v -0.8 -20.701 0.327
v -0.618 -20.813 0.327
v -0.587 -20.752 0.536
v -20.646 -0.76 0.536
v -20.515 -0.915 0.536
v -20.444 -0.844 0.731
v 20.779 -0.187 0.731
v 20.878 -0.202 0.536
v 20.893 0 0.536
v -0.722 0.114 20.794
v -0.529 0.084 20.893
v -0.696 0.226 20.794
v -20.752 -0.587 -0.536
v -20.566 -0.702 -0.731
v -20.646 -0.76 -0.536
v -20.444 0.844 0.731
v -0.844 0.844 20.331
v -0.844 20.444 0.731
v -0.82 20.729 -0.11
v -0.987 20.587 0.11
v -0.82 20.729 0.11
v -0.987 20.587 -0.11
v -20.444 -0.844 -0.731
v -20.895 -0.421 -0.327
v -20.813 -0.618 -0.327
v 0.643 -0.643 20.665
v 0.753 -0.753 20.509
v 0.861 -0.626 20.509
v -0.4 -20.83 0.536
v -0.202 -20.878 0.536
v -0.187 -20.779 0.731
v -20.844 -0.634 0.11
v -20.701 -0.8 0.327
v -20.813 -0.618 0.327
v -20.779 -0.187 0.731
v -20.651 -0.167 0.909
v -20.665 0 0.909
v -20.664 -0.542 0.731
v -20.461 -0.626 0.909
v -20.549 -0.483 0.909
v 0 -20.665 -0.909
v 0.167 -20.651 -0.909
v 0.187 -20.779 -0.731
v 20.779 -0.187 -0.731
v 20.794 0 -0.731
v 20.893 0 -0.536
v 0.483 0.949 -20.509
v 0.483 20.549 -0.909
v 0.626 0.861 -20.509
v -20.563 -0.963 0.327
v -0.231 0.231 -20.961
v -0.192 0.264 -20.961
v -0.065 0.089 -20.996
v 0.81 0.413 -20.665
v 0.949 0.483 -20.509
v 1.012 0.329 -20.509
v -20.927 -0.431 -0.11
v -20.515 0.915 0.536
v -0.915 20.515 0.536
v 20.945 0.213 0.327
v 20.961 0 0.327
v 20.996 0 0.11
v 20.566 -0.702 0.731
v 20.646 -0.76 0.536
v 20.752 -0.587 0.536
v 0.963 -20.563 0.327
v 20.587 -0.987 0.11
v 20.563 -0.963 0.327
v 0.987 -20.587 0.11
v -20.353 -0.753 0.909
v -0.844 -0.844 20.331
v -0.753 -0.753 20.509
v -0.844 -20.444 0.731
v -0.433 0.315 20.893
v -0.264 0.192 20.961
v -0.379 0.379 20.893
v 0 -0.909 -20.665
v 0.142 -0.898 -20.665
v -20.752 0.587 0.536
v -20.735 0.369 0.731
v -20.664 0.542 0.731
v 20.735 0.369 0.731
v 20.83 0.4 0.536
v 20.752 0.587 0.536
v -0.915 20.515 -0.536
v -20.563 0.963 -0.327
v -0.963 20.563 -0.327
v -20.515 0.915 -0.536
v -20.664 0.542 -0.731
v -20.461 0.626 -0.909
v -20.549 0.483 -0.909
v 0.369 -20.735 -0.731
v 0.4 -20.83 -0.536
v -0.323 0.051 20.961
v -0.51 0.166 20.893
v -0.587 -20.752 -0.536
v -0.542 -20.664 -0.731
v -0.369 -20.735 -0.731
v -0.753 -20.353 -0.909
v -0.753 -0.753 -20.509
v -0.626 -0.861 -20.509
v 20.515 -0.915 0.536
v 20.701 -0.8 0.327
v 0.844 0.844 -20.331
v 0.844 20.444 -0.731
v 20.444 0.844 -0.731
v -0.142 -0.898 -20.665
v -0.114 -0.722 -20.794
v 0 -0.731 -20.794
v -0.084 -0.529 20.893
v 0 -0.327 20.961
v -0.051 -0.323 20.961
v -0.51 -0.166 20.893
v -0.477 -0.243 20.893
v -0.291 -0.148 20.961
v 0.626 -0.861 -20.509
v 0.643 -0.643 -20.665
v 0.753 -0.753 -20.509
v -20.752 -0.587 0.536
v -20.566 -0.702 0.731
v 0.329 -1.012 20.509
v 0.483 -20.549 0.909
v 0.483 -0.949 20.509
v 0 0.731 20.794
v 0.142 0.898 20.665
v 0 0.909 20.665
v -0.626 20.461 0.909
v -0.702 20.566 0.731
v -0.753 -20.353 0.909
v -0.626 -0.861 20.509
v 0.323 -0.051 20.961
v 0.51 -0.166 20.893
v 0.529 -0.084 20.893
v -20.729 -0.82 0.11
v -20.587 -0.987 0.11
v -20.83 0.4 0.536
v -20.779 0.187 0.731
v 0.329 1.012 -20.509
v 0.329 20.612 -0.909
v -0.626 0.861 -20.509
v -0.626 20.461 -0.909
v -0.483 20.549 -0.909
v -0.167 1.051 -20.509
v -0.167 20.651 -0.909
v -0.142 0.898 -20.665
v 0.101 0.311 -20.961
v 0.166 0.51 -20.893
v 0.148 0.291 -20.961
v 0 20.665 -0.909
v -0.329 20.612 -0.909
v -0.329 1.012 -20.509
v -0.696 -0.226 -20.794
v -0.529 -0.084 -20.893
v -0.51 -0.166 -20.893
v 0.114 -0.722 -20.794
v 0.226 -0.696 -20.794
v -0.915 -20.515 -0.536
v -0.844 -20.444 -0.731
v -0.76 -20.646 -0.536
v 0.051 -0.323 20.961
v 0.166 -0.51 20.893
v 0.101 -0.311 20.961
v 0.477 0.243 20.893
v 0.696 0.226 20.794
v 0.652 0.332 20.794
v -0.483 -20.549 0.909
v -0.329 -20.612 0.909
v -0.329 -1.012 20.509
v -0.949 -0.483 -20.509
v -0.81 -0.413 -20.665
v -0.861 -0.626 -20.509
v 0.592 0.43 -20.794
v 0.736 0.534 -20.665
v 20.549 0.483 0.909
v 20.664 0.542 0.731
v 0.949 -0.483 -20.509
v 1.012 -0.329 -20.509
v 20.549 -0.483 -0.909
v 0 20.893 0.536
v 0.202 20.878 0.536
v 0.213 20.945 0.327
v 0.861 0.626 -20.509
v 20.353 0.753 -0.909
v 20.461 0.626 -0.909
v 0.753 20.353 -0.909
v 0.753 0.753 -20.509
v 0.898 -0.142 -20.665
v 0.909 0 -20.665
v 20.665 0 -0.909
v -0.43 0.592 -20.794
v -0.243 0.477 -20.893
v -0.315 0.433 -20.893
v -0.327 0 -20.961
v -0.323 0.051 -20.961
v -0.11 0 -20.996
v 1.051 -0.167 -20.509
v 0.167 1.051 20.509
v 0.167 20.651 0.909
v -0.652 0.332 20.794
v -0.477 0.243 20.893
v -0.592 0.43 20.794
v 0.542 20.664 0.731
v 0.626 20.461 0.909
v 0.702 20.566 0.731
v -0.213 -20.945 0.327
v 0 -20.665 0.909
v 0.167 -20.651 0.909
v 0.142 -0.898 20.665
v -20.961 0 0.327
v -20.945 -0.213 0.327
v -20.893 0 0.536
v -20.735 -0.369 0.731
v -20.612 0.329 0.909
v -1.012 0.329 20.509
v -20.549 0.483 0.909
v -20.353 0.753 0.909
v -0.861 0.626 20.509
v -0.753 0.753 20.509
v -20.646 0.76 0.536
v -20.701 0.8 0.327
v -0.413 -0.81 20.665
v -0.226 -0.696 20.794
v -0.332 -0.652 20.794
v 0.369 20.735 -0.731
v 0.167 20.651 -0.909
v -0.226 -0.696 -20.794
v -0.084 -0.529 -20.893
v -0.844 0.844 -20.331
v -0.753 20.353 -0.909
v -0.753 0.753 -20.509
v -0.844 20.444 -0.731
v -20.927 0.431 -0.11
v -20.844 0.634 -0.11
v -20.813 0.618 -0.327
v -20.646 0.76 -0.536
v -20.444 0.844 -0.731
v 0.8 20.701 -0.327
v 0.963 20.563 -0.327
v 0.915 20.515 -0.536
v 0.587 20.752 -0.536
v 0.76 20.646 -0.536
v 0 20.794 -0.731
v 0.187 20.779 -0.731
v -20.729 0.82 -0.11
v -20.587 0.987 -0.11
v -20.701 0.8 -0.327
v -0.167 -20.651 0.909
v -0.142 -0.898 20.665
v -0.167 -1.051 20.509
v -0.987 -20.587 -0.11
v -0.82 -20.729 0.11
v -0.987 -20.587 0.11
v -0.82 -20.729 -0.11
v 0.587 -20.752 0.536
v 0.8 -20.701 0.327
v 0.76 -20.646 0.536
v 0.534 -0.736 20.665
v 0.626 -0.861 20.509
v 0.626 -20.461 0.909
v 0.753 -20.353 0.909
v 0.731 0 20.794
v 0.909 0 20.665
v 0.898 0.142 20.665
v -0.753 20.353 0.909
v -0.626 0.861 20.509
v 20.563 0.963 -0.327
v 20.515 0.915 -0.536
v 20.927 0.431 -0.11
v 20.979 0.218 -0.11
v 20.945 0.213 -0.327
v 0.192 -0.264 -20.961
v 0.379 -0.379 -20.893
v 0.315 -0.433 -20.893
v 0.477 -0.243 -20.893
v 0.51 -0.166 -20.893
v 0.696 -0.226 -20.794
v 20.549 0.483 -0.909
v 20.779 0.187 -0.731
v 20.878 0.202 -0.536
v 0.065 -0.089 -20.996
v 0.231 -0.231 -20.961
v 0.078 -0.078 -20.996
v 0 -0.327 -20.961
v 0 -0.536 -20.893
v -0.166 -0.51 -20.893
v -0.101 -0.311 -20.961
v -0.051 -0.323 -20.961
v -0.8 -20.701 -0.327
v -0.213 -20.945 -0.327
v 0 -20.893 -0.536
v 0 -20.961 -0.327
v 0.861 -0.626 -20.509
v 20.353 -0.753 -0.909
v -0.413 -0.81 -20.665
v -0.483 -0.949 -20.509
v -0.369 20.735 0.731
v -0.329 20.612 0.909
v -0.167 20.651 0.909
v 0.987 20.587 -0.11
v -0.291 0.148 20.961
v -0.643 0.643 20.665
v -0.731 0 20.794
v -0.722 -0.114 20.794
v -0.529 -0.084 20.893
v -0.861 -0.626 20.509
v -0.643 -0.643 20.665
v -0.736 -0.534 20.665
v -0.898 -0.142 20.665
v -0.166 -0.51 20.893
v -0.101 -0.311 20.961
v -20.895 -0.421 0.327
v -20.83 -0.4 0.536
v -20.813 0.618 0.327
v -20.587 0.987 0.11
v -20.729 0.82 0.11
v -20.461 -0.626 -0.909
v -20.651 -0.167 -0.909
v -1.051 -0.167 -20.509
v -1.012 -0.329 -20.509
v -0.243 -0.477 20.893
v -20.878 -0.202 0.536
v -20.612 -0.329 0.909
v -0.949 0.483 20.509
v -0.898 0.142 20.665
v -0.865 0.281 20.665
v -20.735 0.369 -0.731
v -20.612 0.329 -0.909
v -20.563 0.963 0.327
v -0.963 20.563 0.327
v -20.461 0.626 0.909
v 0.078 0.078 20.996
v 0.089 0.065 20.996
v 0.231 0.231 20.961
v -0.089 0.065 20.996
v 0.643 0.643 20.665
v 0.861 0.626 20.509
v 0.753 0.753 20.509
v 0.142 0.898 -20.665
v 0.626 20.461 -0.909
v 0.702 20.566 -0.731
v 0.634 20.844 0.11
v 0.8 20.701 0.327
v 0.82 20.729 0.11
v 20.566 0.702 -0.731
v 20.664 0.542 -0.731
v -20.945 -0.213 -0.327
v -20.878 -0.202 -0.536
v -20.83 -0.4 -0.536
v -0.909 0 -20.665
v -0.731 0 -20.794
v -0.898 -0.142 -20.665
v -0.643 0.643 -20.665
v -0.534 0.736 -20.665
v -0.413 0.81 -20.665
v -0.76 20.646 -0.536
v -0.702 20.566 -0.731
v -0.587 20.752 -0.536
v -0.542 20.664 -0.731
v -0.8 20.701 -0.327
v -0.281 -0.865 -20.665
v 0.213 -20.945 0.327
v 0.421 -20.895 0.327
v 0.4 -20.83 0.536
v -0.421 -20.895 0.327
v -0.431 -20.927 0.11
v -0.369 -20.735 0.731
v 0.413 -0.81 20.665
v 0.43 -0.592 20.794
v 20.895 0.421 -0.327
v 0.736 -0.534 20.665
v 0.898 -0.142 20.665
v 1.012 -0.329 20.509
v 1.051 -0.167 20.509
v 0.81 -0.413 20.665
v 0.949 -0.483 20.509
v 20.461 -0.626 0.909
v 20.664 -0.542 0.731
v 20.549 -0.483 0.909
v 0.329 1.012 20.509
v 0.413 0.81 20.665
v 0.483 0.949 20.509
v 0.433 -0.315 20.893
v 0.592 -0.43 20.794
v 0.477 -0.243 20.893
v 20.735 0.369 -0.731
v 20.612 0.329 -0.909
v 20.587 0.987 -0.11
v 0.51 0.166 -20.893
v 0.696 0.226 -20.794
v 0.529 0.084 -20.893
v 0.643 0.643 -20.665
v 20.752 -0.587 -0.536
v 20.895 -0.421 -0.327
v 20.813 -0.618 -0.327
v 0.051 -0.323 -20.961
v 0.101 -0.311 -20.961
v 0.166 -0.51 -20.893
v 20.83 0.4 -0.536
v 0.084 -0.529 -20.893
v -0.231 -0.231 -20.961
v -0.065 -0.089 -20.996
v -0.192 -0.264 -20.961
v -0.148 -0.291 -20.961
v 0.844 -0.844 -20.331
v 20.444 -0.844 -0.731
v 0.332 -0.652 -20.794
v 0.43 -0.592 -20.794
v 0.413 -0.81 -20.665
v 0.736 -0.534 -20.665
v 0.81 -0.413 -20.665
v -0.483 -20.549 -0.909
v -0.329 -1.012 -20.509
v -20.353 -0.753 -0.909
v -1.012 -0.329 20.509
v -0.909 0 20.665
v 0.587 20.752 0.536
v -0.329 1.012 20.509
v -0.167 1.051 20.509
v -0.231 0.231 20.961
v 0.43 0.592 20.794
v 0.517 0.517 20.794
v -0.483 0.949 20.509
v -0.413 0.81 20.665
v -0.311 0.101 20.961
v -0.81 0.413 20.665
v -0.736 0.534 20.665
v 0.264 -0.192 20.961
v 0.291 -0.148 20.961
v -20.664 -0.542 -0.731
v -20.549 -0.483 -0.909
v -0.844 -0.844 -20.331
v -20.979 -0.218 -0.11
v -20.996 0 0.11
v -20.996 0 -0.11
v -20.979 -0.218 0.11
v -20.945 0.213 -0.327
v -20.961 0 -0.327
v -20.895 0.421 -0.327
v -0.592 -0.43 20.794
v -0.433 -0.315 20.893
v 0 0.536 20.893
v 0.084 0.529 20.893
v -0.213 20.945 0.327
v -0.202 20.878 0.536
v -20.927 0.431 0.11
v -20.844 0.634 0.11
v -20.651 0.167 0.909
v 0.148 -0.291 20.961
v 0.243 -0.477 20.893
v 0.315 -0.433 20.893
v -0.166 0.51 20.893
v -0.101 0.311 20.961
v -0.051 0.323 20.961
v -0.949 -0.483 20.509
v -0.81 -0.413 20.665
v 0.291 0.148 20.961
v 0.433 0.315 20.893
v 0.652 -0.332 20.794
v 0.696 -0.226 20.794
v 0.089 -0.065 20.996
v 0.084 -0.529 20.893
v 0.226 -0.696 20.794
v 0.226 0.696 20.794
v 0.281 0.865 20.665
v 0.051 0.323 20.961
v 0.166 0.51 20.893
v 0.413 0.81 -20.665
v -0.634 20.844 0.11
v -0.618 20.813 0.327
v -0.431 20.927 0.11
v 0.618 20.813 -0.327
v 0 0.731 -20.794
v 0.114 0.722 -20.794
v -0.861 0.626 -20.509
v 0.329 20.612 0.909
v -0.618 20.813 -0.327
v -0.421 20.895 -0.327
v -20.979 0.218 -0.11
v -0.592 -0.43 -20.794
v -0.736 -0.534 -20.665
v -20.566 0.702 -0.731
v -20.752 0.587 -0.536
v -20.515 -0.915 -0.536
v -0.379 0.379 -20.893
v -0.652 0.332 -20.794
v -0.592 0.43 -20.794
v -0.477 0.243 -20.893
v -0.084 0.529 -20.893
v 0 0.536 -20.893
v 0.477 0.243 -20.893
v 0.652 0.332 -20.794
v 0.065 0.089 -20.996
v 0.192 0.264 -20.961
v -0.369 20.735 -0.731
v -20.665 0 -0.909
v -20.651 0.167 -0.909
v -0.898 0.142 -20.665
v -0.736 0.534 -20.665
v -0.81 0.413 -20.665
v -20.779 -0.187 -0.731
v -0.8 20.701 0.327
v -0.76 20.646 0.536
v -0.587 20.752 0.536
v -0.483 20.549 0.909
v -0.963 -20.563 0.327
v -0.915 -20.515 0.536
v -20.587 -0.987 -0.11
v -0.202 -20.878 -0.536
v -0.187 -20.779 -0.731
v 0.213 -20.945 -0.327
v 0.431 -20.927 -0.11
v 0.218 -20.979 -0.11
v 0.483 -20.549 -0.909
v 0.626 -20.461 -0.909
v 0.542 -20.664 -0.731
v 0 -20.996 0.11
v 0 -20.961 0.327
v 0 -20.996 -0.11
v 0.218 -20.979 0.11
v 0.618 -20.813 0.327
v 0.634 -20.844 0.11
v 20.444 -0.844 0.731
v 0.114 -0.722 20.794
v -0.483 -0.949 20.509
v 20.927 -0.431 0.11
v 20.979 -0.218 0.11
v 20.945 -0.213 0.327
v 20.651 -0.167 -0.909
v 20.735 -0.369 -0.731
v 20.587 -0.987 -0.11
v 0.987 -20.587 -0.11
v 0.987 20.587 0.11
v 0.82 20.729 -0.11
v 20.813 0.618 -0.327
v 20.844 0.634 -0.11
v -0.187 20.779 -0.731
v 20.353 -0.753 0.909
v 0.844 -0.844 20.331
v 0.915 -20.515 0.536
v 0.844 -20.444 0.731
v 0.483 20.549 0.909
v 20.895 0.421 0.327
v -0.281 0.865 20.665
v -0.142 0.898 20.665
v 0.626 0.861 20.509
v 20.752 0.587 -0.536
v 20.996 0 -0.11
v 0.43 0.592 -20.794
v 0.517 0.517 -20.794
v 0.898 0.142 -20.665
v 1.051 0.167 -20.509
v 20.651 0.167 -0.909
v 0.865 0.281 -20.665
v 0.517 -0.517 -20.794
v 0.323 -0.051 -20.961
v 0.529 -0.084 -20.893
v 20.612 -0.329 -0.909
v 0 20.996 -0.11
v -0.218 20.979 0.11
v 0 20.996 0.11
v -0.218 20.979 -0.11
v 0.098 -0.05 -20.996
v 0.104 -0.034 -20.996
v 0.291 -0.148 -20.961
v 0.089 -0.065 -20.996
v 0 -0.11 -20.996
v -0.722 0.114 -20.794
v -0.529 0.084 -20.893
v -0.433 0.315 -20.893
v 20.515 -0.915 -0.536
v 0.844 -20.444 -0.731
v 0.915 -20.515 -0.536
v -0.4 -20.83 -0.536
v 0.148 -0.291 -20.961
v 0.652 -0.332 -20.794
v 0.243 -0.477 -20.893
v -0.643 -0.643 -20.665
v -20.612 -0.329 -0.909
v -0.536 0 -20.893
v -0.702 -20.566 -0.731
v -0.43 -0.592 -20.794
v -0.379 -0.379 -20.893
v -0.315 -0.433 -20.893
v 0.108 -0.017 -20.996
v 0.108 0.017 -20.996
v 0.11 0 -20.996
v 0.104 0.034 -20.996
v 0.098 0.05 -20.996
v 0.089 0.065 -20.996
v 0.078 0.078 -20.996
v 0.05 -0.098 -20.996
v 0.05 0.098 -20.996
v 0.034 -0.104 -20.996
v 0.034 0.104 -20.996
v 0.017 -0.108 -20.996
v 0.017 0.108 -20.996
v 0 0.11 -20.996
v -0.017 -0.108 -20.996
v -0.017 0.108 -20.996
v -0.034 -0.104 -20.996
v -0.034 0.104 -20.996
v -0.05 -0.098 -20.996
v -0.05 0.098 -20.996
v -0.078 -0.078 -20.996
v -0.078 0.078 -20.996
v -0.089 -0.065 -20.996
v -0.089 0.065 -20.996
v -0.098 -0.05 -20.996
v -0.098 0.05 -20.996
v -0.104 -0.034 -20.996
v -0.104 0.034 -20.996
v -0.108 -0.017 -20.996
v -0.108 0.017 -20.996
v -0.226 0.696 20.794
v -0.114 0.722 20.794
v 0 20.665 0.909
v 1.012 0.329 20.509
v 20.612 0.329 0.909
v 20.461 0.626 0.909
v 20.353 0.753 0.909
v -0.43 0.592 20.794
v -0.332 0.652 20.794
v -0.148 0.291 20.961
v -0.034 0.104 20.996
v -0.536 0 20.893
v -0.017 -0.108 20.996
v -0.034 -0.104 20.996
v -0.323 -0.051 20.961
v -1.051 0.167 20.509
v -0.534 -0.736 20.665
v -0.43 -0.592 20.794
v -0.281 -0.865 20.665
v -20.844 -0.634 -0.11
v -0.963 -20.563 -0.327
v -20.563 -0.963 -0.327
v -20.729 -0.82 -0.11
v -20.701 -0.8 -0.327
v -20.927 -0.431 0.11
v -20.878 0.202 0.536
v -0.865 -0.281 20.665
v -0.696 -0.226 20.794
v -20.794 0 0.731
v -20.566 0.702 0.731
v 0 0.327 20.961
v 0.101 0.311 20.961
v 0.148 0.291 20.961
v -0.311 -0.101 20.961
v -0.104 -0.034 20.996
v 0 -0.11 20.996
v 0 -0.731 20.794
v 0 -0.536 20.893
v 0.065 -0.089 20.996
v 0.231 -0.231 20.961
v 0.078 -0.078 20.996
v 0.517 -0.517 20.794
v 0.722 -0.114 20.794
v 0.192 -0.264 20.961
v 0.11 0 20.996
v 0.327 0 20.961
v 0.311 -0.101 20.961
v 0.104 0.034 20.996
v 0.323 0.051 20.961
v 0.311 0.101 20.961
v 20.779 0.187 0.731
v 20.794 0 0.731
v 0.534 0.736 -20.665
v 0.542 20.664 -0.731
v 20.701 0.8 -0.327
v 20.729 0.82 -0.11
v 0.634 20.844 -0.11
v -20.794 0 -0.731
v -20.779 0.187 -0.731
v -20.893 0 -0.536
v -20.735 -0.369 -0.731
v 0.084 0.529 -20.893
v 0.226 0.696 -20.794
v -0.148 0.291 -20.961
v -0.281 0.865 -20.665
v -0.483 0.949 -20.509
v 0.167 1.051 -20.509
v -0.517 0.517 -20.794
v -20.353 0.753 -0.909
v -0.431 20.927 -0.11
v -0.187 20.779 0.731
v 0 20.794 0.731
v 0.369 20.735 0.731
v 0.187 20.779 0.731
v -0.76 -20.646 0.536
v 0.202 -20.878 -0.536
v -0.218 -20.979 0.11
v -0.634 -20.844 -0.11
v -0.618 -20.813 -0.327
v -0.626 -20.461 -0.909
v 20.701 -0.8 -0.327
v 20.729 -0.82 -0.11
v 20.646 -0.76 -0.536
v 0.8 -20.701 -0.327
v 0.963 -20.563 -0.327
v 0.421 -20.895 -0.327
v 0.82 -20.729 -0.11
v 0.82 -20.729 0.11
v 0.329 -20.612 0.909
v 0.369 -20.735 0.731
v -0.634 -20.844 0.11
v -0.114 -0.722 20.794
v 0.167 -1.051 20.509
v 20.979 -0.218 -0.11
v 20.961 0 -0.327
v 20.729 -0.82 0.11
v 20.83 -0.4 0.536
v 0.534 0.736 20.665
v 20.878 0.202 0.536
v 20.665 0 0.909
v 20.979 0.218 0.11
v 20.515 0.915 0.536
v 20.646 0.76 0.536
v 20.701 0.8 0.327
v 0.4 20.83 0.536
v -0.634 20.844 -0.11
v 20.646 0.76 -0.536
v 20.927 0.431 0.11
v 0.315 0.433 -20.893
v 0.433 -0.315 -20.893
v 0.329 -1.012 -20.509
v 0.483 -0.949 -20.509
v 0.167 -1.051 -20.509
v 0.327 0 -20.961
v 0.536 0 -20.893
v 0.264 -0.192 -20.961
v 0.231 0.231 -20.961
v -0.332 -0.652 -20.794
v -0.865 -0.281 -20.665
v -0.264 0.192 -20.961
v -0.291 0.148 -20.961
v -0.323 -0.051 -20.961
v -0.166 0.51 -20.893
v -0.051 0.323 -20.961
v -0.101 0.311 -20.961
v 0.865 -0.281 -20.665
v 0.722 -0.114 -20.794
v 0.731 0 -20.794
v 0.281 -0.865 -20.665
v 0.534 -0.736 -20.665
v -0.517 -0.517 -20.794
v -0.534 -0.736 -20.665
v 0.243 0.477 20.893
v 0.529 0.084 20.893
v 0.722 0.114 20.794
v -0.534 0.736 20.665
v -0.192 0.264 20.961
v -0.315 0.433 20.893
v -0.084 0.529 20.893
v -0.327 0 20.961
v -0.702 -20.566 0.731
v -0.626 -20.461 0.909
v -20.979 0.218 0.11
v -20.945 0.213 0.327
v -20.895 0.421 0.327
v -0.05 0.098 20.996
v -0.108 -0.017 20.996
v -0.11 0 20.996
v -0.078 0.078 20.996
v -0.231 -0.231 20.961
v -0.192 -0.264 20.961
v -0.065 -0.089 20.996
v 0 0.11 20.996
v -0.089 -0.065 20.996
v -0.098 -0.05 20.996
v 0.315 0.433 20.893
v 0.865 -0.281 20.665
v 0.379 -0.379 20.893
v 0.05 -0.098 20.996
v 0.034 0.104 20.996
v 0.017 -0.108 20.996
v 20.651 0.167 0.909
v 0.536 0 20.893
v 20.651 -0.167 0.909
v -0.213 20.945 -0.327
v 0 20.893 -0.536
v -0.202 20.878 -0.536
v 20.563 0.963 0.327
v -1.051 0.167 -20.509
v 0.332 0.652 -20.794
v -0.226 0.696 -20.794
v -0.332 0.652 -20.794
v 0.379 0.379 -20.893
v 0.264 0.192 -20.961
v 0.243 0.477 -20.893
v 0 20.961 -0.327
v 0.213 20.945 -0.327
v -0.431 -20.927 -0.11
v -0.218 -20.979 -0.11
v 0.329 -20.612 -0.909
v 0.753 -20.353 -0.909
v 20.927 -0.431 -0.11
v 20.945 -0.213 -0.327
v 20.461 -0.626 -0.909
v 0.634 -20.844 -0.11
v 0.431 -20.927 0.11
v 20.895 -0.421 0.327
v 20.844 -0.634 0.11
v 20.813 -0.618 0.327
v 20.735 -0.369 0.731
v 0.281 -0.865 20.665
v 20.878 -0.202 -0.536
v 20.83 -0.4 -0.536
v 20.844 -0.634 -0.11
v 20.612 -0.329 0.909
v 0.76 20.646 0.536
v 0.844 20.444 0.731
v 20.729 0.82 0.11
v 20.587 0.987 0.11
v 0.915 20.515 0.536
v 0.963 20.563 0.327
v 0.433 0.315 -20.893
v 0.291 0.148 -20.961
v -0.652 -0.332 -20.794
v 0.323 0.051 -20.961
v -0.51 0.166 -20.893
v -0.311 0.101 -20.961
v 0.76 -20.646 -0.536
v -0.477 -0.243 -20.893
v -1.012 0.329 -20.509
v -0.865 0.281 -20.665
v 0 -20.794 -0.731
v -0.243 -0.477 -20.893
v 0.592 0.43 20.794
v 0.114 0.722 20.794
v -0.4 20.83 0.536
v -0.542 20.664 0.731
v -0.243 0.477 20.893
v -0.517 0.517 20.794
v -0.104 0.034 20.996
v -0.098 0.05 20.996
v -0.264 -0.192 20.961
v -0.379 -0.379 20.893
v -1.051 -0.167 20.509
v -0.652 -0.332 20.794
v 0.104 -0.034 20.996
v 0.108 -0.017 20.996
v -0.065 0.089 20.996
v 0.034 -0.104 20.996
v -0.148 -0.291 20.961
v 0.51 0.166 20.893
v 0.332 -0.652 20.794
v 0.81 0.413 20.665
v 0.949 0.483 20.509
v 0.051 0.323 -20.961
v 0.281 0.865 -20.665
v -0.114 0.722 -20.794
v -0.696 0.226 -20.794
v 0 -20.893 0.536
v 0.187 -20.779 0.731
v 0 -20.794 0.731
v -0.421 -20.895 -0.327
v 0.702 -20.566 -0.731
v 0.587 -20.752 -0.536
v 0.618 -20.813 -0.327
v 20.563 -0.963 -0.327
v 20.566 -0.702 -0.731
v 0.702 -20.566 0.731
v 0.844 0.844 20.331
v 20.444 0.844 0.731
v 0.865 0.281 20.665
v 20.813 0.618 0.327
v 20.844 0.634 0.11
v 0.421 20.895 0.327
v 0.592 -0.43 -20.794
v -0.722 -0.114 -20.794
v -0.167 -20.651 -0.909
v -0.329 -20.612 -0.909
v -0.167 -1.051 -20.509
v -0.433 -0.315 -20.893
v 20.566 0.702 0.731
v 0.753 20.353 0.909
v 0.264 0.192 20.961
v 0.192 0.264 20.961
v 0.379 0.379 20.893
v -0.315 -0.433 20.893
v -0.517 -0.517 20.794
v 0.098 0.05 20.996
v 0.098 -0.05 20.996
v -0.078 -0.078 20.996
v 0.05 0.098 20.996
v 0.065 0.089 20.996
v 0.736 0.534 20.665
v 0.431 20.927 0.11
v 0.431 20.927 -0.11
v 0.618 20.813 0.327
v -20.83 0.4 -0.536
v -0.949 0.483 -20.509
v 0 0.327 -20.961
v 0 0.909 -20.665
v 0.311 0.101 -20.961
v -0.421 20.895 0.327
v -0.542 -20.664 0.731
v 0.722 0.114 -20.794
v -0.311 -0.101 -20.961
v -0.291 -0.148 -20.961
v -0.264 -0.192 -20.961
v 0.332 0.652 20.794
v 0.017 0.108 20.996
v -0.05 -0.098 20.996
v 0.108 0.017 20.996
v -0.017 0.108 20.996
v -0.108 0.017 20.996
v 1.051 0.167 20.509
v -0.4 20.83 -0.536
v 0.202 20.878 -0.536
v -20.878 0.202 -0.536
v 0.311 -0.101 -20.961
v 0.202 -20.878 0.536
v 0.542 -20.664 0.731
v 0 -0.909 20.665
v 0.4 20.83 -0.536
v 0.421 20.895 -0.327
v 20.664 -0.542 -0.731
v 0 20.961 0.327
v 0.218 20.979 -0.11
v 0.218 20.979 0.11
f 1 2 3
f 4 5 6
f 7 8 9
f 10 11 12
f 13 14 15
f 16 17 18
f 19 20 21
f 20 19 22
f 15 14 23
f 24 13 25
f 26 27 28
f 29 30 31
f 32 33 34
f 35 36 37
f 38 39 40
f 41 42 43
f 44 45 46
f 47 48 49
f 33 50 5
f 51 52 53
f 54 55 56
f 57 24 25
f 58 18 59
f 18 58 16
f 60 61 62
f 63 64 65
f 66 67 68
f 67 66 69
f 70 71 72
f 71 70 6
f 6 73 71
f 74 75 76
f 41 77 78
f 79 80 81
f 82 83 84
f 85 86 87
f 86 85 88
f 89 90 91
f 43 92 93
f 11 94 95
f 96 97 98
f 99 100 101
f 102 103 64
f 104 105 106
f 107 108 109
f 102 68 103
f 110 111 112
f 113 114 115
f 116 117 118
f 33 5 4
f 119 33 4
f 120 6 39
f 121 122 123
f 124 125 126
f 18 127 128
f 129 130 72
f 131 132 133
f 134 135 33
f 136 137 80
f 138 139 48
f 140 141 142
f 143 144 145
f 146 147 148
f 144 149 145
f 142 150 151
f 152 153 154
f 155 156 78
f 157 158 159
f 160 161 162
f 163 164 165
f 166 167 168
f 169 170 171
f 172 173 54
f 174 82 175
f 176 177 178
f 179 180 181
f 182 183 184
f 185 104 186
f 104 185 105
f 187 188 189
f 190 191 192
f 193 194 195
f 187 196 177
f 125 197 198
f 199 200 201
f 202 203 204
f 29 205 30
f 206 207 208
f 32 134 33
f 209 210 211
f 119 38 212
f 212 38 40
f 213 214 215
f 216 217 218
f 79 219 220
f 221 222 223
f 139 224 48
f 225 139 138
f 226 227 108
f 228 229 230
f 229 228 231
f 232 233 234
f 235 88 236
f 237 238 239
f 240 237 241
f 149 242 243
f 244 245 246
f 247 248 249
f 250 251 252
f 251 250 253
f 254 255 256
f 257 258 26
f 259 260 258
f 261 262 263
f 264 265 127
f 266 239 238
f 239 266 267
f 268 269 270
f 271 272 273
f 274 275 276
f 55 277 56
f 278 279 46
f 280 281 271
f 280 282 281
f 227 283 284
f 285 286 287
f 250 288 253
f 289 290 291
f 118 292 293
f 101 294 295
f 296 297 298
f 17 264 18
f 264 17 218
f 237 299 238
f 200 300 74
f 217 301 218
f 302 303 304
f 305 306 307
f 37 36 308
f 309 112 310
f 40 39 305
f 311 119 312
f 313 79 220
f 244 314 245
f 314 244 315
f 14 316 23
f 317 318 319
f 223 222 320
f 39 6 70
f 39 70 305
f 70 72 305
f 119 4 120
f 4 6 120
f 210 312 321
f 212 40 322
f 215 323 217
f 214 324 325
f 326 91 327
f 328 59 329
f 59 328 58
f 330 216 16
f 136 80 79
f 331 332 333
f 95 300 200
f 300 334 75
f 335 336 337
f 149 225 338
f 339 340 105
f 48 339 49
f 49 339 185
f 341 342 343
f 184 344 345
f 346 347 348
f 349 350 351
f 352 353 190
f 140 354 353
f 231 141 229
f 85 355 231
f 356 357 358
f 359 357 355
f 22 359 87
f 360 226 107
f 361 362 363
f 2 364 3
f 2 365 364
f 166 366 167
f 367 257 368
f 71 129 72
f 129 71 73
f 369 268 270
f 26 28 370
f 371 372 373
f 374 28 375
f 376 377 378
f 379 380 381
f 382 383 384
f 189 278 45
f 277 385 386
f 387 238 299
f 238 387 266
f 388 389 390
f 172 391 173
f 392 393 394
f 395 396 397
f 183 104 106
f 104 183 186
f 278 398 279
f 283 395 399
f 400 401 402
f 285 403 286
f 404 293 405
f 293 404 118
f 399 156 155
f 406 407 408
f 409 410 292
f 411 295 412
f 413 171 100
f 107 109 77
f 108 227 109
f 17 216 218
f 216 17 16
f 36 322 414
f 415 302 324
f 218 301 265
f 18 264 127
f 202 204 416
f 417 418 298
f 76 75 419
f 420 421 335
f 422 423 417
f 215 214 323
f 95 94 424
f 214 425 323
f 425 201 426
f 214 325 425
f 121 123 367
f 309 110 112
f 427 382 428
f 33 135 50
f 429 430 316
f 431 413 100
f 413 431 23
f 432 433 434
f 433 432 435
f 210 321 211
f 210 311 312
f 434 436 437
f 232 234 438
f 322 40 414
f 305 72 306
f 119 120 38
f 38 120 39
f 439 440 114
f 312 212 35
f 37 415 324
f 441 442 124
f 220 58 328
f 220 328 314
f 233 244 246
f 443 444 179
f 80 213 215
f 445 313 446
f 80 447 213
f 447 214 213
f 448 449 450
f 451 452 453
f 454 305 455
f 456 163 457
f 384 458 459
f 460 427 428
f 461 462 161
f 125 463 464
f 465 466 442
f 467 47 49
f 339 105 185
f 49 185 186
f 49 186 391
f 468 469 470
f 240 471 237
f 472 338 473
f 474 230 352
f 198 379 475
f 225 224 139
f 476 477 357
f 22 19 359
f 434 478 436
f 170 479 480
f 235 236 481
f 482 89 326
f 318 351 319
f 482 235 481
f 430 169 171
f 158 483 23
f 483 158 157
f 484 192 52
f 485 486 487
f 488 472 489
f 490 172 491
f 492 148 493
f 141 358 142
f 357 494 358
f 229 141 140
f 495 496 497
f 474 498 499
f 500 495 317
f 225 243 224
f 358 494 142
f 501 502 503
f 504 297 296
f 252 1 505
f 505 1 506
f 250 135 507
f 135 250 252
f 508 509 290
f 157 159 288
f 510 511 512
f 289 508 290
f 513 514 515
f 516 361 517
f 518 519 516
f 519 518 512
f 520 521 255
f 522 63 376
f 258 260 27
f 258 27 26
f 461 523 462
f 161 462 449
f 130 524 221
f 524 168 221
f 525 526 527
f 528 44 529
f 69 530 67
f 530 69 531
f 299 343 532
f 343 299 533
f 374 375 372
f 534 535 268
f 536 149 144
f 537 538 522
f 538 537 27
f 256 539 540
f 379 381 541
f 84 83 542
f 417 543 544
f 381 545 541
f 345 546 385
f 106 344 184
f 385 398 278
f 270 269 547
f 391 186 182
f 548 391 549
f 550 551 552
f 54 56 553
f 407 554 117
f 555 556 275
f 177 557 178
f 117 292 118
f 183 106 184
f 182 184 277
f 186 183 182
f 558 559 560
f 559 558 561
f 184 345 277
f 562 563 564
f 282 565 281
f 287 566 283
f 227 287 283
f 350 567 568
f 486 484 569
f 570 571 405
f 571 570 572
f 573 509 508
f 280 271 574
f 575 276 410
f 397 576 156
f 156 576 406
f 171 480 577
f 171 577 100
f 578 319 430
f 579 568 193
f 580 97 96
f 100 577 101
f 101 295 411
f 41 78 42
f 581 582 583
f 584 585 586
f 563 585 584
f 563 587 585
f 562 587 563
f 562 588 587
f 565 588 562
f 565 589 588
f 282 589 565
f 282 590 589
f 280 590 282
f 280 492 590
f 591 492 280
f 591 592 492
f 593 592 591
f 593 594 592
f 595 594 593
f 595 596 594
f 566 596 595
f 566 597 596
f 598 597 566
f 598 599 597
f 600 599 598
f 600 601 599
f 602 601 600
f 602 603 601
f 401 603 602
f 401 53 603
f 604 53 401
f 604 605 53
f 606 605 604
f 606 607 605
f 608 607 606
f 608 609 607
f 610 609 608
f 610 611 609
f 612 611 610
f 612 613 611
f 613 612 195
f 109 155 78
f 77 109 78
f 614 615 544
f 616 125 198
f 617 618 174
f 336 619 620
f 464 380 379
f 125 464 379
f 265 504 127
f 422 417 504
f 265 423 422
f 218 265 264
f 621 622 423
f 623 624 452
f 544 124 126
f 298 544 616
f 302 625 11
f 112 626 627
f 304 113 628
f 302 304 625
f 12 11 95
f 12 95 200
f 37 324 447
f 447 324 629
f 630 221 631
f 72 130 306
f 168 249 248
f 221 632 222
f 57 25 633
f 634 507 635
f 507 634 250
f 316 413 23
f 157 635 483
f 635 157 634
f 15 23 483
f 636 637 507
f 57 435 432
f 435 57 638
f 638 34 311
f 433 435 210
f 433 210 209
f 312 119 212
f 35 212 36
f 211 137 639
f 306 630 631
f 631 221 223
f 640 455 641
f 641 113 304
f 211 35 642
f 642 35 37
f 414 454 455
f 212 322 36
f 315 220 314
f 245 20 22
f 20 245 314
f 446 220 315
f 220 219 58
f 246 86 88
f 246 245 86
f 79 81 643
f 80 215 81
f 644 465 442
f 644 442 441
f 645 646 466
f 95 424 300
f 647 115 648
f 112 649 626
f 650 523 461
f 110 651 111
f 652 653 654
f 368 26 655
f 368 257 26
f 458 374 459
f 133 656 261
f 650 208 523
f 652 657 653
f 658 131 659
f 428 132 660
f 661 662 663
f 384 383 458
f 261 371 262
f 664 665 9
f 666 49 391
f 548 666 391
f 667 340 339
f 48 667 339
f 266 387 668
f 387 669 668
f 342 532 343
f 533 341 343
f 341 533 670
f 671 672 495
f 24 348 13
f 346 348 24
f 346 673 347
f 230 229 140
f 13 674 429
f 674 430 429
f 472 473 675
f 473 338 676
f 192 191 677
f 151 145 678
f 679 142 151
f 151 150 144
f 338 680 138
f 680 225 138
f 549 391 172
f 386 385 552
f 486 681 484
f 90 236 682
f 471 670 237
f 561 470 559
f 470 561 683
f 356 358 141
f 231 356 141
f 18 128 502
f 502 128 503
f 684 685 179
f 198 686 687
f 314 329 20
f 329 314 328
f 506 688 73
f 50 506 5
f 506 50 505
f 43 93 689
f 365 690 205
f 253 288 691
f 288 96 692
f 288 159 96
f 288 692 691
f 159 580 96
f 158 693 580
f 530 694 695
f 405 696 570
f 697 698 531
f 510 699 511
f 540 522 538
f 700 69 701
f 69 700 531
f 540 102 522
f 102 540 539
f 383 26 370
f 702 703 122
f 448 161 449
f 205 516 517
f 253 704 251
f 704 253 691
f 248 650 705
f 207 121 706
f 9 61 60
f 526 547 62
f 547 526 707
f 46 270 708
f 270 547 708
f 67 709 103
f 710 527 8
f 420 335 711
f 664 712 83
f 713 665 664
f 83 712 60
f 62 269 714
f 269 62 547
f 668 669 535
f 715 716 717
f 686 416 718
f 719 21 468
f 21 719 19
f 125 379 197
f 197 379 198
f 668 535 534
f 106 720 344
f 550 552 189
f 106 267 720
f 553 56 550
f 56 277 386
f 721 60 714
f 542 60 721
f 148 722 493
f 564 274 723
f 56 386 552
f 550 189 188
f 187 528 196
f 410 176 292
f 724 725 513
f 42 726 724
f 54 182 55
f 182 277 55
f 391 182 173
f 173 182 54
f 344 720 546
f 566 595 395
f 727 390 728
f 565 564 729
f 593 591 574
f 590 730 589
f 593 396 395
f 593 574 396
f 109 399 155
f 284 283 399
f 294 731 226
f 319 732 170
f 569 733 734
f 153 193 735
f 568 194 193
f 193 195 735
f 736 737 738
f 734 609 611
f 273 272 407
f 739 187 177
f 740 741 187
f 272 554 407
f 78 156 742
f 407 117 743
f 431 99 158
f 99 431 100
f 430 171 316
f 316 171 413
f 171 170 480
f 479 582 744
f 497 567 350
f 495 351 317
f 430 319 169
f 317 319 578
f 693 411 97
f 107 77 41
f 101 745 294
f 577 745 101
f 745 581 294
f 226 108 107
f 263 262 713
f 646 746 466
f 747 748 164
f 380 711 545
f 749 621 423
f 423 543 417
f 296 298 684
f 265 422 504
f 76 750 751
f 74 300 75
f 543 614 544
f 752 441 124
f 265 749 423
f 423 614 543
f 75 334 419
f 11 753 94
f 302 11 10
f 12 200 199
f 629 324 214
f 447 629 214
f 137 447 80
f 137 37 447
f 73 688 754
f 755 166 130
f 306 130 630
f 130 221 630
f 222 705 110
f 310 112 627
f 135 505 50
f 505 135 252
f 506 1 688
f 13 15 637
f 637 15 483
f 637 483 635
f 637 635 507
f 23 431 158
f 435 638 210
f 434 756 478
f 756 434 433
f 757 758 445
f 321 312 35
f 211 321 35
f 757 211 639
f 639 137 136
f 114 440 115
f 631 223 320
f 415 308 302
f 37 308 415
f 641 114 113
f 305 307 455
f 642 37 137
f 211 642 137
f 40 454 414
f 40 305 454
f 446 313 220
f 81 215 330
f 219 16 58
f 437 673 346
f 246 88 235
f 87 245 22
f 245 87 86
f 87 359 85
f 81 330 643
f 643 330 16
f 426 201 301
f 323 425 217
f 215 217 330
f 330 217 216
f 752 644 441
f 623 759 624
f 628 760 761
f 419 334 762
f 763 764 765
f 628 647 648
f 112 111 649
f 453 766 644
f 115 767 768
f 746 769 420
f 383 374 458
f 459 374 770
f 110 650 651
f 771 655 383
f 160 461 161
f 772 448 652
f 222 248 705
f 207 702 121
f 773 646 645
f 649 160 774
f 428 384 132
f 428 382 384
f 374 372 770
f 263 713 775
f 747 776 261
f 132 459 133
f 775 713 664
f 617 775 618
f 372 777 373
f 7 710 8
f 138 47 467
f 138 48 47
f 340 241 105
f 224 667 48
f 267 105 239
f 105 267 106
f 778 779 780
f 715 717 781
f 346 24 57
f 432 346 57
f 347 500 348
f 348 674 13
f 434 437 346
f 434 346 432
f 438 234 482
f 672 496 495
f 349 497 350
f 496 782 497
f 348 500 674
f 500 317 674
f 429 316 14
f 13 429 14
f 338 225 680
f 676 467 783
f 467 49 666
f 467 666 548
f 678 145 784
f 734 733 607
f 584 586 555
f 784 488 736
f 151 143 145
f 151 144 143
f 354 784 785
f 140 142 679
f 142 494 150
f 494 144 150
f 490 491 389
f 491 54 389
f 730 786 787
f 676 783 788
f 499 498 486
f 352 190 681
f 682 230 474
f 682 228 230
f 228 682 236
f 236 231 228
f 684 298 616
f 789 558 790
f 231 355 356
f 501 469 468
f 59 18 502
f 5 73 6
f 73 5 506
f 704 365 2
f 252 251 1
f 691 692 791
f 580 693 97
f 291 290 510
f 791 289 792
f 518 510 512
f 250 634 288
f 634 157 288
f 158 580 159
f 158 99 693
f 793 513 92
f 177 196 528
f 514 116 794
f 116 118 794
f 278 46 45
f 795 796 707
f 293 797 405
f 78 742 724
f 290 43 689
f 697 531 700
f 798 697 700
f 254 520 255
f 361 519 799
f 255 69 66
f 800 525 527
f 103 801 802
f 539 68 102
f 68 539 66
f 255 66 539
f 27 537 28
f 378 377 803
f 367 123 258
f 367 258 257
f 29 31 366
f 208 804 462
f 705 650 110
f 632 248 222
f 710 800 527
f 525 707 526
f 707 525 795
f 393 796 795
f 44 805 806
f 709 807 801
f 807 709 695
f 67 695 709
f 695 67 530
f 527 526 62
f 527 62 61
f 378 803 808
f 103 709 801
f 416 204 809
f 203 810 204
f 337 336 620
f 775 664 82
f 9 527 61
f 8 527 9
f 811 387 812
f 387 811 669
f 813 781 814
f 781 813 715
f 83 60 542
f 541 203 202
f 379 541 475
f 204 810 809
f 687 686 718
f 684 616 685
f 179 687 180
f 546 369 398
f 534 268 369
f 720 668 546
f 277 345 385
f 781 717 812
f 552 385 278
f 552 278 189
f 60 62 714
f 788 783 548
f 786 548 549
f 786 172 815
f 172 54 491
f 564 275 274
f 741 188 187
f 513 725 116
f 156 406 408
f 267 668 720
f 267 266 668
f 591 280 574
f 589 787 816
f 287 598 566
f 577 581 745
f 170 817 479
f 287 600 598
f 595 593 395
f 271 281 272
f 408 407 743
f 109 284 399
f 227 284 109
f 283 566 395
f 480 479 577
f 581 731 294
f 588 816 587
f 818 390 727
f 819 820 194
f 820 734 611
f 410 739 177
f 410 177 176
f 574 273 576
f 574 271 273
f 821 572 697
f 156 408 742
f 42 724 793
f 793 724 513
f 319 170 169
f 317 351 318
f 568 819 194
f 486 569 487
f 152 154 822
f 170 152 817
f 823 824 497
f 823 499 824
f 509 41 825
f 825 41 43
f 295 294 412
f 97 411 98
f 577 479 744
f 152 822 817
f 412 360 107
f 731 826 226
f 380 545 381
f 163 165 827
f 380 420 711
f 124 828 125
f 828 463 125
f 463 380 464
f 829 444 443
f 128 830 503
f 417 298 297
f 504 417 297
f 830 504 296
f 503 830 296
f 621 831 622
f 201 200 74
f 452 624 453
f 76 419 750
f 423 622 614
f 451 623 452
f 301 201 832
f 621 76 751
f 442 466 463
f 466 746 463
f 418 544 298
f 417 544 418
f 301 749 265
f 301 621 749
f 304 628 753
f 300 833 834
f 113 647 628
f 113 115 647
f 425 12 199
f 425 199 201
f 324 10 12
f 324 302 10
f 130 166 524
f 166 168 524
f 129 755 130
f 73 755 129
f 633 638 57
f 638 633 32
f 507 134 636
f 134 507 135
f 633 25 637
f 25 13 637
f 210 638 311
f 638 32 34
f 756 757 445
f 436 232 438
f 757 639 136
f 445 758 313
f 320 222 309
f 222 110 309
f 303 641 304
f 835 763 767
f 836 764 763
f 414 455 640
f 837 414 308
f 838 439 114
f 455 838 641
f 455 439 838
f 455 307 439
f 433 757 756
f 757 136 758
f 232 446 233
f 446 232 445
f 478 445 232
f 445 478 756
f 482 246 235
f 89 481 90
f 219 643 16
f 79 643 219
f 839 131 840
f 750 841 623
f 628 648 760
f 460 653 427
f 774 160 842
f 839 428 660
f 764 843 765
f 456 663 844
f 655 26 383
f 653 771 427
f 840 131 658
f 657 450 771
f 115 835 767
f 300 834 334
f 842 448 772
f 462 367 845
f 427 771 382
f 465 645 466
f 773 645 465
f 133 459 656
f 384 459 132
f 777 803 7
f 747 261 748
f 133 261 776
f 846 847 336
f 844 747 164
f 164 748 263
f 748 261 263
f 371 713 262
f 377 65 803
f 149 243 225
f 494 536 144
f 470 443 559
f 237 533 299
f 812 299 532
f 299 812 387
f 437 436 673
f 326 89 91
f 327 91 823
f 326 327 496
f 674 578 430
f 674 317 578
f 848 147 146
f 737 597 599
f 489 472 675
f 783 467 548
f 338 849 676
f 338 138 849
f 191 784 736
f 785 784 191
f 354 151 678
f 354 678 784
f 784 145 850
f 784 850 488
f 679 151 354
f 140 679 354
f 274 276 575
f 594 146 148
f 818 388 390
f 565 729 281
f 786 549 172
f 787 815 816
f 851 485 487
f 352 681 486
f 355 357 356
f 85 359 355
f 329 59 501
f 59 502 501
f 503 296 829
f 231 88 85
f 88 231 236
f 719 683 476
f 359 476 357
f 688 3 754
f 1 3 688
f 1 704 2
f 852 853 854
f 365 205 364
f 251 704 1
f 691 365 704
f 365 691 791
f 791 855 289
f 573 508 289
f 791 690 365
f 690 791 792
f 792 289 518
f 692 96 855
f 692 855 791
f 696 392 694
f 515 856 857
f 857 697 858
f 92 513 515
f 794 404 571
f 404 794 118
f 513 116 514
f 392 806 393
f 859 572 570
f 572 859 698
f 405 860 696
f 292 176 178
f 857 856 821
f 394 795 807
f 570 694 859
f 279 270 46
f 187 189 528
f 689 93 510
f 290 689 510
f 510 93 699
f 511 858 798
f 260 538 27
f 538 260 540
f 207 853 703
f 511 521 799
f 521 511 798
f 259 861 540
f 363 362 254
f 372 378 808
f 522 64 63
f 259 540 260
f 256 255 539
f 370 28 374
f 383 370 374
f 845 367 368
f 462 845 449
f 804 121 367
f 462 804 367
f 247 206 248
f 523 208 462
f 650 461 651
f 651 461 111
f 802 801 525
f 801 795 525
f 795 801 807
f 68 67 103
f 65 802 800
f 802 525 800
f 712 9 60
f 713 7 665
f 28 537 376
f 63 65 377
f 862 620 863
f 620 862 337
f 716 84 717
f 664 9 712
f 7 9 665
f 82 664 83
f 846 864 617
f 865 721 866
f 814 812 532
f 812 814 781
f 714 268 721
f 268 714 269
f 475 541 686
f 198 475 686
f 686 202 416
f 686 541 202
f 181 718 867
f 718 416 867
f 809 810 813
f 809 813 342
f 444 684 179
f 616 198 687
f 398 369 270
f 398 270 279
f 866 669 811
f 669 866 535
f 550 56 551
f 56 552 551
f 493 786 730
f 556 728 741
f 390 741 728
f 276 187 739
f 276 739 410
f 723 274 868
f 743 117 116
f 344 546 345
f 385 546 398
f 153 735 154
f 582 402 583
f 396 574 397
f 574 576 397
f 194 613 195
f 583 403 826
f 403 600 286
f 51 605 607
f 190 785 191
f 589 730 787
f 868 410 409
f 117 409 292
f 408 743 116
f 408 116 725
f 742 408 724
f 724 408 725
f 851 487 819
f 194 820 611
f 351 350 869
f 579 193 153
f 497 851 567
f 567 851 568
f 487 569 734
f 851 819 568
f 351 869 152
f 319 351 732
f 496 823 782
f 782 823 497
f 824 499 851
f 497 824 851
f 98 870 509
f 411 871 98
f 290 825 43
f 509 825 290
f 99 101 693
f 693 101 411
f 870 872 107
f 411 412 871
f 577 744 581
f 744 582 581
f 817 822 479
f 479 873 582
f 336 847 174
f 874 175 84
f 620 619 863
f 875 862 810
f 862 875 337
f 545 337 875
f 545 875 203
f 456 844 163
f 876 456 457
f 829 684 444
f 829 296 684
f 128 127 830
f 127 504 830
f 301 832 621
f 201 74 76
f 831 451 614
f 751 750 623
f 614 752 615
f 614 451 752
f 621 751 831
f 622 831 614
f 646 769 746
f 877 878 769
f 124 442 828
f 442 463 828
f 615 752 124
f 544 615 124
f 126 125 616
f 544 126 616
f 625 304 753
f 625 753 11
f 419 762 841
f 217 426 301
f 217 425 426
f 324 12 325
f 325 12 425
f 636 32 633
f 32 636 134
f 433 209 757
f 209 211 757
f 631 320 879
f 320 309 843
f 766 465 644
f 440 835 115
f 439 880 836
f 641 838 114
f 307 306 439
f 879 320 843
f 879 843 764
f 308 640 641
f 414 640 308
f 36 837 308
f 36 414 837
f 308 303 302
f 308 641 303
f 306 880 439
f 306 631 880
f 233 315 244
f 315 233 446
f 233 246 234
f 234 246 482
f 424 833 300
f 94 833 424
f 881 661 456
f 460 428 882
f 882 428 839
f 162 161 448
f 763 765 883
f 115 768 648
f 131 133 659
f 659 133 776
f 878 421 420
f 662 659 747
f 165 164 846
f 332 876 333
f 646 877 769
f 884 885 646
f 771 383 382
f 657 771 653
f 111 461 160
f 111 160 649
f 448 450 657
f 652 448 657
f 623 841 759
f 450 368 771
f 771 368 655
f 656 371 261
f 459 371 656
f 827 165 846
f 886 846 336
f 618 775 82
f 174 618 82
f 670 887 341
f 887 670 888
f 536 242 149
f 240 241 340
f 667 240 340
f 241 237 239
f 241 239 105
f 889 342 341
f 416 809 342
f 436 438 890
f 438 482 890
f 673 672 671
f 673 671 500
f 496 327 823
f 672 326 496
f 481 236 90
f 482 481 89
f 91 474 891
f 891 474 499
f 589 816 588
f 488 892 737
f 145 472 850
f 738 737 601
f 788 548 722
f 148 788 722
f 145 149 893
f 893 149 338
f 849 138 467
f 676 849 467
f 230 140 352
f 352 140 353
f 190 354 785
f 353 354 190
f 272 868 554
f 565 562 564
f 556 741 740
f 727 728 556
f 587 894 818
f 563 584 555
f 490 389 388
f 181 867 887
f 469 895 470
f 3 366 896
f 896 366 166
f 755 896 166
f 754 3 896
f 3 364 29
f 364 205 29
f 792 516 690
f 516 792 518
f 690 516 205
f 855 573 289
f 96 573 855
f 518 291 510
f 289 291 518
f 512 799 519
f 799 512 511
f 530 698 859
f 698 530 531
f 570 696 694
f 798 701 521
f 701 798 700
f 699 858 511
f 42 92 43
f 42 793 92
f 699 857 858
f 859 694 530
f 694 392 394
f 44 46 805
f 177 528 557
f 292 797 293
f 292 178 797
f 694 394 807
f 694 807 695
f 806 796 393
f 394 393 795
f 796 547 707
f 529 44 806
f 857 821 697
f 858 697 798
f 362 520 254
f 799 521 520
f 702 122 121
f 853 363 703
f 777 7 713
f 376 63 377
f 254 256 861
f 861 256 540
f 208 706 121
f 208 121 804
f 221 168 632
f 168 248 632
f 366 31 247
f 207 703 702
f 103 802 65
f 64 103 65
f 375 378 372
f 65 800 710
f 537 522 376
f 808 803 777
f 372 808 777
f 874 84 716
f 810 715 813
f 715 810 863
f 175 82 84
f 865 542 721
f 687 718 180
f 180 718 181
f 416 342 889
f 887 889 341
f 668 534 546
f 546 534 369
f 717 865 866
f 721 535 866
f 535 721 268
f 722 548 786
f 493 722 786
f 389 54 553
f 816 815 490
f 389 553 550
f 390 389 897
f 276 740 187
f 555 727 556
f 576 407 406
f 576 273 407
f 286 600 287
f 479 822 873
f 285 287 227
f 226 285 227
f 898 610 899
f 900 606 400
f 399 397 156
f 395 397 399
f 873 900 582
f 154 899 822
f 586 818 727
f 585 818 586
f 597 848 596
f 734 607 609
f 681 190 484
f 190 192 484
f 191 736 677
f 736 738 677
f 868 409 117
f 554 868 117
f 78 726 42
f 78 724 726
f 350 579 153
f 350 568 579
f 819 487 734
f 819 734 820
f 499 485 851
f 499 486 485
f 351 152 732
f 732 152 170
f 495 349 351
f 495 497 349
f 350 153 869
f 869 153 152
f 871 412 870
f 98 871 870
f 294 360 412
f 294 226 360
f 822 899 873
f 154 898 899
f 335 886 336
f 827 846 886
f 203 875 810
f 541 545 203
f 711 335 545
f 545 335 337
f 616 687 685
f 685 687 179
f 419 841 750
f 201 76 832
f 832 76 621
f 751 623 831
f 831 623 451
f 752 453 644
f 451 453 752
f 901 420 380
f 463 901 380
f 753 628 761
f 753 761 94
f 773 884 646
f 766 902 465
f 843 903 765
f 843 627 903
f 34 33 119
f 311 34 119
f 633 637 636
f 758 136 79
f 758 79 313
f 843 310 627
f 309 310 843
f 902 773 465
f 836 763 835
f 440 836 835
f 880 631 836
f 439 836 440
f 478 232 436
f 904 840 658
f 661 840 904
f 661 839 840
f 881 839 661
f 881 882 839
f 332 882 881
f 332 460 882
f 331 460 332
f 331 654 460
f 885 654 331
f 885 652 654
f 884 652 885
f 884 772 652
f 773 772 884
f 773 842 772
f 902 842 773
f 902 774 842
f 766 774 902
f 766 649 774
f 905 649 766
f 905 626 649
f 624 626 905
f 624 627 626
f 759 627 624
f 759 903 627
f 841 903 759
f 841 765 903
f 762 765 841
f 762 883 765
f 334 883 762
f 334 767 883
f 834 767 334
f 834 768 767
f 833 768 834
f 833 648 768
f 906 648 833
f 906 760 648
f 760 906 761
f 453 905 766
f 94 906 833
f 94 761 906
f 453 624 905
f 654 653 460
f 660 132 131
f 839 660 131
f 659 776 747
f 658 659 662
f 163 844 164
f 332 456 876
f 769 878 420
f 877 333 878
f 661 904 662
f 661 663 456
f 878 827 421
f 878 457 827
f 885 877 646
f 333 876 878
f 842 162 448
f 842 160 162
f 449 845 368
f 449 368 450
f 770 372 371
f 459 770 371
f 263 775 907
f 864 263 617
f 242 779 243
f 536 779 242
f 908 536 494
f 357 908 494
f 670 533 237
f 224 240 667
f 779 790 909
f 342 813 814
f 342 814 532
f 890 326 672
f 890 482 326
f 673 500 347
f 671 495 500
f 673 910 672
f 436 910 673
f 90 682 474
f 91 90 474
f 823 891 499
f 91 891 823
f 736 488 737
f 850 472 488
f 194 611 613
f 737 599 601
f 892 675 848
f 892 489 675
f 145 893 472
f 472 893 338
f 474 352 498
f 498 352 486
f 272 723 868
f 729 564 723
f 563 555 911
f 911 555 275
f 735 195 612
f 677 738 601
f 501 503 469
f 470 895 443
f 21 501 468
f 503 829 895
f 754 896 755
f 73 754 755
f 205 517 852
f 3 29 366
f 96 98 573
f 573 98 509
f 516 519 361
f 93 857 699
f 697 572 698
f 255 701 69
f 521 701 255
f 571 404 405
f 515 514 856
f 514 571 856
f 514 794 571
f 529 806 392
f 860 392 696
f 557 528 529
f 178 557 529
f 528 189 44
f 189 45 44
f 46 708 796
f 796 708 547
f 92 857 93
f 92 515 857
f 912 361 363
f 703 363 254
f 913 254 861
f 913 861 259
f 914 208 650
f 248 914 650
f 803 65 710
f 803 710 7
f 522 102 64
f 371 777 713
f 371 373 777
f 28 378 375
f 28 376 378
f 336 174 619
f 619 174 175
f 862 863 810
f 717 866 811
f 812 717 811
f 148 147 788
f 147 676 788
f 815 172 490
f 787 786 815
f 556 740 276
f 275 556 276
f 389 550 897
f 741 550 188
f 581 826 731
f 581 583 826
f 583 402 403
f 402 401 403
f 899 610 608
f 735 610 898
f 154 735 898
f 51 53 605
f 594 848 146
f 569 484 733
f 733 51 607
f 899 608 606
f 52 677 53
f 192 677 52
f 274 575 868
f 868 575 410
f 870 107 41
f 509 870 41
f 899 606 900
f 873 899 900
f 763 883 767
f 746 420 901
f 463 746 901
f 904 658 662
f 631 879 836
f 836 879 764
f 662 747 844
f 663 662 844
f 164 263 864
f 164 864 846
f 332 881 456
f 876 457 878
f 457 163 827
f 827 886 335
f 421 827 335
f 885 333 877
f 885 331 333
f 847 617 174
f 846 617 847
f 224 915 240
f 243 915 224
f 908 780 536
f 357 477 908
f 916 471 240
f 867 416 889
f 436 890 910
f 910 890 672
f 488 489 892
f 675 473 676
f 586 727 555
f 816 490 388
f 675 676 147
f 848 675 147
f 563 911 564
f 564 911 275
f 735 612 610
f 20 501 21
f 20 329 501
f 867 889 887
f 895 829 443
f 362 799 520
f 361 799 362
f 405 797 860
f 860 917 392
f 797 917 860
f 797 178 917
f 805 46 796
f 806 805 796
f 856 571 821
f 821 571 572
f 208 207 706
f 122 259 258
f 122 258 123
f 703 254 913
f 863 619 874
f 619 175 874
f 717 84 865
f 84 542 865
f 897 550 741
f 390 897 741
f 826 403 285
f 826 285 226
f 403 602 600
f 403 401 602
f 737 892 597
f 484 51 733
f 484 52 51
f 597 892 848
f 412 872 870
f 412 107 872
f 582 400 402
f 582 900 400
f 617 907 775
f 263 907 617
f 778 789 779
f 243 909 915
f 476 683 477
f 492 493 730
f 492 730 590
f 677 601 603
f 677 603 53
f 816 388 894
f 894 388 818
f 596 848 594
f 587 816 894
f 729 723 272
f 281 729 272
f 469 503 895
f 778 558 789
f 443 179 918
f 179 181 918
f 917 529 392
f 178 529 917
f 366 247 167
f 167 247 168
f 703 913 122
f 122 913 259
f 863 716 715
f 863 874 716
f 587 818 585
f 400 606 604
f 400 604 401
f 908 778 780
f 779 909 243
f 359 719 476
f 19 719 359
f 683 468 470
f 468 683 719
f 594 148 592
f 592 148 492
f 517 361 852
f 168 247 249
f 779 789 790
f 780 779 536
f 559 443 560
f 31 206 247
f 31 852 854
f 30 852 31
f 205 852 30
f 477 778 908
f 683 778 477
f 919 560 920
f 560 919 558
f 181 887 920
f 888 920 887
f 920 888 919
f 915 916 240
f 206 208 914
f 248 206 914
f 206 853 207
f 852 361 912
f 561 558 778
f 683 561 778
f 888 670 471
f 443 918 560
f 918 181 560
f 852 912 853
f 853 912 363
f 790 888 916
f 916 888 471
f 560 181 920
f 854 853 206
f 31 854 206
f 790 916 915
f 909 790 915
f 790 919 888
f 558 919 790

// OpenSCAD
// Polyhedral story die with icon + label per face. Faces oriented apex-up.
shape="d8"; size=42; rr=1.4; glyph=10; tsize=4.2; icon_y=3.5; text_y=-5.2; depth=0.6; $fn=40;
icons=[]; labels=[];
phi=(1+sqrt(5))/2;
function pts(s) =
  s=="d4"  ? [[1,1,1],[1,-1,-1],[-1,1,-1],[-1,-1,1]] :
  s=="d6"  ? [for(x=[-1,1],y=[-1,1],z=[-1,1]) [x,y,z]] :
  s=="d8"  ? [[1,0,0],[-1,0,0],[0,1,0],[0,-1,0],[0,0,1],[0,0,-1]] :
  s=="d12" ? concat([for(x=[-1,1],y=[-1,1],z=[-1,1]) [x,y,z]],
               [for(y=[-1,1],z=[-1,1]) [0,y/phi,z*phi]],
               [for(x=[-1,1],y=[-1,1]) [x/phi,y*phi,0]],
               [for(x=[-1,1],z=[-1,1]) [x*phi,0,z/phi]]) :
  s=="d20" ? concat([for(y=[-1,1],z=[-1,1]) [0,y,z*phi]],
               [for(x=[-1,1],y=[-1,1]) [x,y*phi,0]],
               [for(x=[-1,1],z=[-1,1]) [x*phi,0,z]]) : [];
function nrm(s) =
  s=="d4"  ? [for(p=pts("d4"))  -p/norm(p)] : s=="d6" ? [for(p=pts("d8")) p/norm(p)] :
  s=="d8"  ? [for(p=pts("d6"))   p/norm(p)] : s=="d12"? [for(p=pts("d20")) p/norm(p)] :
  s=="d20" ? [for(p=pts("d12"))  p/norm(p)] : [];
function vsum(v,i=0) = i>=len(v) ? [0,0,0] : v[i]+vsum(v,i+1);
K = (size/2 - rr) / max([for(q=pts(shape)) norm(q)]);
module body(){ hull() for(q=pts(shape)) translate(q*K) sphere(r=rr); }
module cut(i){
  n  = nrm(shape)[i];
  DM = max([for(q=pts(shape)) (q*K)*n]);
  FV = [for(q=pts(shape)) if (((q*K)*n) > DM-0.01) q*K];   // this face's vertices
  C  = vsum(FV)/len(FV);
  u  = (FV[0]-C)/norm(FV[0]-C);                            // up = toward a vertex (apex-up)
  r  = cross(u,n);
  d  = DM + rr;
  multmatrix([[r[0],u[0],n[0], n[0]*d],[r[1],u[1],n[1], n[1]*d],
              [r[2],u[2],n[2], n[2]*d],[0,0,0,1]])
    translate([0,0,-depth]) linear_extrude(height=depth+2){
      translate([0,icon_y,0]) resize([glyph,glyph,0],auto=true) import(icons[i],center=true);
      if(labels[i]!="") translate([0,text_y,0])
        text(labels[i],size=tsize,font="Helvetica:style=Bold",halign="center",valign="center");
    }
}
difference(){ body(); for(i=[0:len(nrm(shape))-1]) cut(i); }
